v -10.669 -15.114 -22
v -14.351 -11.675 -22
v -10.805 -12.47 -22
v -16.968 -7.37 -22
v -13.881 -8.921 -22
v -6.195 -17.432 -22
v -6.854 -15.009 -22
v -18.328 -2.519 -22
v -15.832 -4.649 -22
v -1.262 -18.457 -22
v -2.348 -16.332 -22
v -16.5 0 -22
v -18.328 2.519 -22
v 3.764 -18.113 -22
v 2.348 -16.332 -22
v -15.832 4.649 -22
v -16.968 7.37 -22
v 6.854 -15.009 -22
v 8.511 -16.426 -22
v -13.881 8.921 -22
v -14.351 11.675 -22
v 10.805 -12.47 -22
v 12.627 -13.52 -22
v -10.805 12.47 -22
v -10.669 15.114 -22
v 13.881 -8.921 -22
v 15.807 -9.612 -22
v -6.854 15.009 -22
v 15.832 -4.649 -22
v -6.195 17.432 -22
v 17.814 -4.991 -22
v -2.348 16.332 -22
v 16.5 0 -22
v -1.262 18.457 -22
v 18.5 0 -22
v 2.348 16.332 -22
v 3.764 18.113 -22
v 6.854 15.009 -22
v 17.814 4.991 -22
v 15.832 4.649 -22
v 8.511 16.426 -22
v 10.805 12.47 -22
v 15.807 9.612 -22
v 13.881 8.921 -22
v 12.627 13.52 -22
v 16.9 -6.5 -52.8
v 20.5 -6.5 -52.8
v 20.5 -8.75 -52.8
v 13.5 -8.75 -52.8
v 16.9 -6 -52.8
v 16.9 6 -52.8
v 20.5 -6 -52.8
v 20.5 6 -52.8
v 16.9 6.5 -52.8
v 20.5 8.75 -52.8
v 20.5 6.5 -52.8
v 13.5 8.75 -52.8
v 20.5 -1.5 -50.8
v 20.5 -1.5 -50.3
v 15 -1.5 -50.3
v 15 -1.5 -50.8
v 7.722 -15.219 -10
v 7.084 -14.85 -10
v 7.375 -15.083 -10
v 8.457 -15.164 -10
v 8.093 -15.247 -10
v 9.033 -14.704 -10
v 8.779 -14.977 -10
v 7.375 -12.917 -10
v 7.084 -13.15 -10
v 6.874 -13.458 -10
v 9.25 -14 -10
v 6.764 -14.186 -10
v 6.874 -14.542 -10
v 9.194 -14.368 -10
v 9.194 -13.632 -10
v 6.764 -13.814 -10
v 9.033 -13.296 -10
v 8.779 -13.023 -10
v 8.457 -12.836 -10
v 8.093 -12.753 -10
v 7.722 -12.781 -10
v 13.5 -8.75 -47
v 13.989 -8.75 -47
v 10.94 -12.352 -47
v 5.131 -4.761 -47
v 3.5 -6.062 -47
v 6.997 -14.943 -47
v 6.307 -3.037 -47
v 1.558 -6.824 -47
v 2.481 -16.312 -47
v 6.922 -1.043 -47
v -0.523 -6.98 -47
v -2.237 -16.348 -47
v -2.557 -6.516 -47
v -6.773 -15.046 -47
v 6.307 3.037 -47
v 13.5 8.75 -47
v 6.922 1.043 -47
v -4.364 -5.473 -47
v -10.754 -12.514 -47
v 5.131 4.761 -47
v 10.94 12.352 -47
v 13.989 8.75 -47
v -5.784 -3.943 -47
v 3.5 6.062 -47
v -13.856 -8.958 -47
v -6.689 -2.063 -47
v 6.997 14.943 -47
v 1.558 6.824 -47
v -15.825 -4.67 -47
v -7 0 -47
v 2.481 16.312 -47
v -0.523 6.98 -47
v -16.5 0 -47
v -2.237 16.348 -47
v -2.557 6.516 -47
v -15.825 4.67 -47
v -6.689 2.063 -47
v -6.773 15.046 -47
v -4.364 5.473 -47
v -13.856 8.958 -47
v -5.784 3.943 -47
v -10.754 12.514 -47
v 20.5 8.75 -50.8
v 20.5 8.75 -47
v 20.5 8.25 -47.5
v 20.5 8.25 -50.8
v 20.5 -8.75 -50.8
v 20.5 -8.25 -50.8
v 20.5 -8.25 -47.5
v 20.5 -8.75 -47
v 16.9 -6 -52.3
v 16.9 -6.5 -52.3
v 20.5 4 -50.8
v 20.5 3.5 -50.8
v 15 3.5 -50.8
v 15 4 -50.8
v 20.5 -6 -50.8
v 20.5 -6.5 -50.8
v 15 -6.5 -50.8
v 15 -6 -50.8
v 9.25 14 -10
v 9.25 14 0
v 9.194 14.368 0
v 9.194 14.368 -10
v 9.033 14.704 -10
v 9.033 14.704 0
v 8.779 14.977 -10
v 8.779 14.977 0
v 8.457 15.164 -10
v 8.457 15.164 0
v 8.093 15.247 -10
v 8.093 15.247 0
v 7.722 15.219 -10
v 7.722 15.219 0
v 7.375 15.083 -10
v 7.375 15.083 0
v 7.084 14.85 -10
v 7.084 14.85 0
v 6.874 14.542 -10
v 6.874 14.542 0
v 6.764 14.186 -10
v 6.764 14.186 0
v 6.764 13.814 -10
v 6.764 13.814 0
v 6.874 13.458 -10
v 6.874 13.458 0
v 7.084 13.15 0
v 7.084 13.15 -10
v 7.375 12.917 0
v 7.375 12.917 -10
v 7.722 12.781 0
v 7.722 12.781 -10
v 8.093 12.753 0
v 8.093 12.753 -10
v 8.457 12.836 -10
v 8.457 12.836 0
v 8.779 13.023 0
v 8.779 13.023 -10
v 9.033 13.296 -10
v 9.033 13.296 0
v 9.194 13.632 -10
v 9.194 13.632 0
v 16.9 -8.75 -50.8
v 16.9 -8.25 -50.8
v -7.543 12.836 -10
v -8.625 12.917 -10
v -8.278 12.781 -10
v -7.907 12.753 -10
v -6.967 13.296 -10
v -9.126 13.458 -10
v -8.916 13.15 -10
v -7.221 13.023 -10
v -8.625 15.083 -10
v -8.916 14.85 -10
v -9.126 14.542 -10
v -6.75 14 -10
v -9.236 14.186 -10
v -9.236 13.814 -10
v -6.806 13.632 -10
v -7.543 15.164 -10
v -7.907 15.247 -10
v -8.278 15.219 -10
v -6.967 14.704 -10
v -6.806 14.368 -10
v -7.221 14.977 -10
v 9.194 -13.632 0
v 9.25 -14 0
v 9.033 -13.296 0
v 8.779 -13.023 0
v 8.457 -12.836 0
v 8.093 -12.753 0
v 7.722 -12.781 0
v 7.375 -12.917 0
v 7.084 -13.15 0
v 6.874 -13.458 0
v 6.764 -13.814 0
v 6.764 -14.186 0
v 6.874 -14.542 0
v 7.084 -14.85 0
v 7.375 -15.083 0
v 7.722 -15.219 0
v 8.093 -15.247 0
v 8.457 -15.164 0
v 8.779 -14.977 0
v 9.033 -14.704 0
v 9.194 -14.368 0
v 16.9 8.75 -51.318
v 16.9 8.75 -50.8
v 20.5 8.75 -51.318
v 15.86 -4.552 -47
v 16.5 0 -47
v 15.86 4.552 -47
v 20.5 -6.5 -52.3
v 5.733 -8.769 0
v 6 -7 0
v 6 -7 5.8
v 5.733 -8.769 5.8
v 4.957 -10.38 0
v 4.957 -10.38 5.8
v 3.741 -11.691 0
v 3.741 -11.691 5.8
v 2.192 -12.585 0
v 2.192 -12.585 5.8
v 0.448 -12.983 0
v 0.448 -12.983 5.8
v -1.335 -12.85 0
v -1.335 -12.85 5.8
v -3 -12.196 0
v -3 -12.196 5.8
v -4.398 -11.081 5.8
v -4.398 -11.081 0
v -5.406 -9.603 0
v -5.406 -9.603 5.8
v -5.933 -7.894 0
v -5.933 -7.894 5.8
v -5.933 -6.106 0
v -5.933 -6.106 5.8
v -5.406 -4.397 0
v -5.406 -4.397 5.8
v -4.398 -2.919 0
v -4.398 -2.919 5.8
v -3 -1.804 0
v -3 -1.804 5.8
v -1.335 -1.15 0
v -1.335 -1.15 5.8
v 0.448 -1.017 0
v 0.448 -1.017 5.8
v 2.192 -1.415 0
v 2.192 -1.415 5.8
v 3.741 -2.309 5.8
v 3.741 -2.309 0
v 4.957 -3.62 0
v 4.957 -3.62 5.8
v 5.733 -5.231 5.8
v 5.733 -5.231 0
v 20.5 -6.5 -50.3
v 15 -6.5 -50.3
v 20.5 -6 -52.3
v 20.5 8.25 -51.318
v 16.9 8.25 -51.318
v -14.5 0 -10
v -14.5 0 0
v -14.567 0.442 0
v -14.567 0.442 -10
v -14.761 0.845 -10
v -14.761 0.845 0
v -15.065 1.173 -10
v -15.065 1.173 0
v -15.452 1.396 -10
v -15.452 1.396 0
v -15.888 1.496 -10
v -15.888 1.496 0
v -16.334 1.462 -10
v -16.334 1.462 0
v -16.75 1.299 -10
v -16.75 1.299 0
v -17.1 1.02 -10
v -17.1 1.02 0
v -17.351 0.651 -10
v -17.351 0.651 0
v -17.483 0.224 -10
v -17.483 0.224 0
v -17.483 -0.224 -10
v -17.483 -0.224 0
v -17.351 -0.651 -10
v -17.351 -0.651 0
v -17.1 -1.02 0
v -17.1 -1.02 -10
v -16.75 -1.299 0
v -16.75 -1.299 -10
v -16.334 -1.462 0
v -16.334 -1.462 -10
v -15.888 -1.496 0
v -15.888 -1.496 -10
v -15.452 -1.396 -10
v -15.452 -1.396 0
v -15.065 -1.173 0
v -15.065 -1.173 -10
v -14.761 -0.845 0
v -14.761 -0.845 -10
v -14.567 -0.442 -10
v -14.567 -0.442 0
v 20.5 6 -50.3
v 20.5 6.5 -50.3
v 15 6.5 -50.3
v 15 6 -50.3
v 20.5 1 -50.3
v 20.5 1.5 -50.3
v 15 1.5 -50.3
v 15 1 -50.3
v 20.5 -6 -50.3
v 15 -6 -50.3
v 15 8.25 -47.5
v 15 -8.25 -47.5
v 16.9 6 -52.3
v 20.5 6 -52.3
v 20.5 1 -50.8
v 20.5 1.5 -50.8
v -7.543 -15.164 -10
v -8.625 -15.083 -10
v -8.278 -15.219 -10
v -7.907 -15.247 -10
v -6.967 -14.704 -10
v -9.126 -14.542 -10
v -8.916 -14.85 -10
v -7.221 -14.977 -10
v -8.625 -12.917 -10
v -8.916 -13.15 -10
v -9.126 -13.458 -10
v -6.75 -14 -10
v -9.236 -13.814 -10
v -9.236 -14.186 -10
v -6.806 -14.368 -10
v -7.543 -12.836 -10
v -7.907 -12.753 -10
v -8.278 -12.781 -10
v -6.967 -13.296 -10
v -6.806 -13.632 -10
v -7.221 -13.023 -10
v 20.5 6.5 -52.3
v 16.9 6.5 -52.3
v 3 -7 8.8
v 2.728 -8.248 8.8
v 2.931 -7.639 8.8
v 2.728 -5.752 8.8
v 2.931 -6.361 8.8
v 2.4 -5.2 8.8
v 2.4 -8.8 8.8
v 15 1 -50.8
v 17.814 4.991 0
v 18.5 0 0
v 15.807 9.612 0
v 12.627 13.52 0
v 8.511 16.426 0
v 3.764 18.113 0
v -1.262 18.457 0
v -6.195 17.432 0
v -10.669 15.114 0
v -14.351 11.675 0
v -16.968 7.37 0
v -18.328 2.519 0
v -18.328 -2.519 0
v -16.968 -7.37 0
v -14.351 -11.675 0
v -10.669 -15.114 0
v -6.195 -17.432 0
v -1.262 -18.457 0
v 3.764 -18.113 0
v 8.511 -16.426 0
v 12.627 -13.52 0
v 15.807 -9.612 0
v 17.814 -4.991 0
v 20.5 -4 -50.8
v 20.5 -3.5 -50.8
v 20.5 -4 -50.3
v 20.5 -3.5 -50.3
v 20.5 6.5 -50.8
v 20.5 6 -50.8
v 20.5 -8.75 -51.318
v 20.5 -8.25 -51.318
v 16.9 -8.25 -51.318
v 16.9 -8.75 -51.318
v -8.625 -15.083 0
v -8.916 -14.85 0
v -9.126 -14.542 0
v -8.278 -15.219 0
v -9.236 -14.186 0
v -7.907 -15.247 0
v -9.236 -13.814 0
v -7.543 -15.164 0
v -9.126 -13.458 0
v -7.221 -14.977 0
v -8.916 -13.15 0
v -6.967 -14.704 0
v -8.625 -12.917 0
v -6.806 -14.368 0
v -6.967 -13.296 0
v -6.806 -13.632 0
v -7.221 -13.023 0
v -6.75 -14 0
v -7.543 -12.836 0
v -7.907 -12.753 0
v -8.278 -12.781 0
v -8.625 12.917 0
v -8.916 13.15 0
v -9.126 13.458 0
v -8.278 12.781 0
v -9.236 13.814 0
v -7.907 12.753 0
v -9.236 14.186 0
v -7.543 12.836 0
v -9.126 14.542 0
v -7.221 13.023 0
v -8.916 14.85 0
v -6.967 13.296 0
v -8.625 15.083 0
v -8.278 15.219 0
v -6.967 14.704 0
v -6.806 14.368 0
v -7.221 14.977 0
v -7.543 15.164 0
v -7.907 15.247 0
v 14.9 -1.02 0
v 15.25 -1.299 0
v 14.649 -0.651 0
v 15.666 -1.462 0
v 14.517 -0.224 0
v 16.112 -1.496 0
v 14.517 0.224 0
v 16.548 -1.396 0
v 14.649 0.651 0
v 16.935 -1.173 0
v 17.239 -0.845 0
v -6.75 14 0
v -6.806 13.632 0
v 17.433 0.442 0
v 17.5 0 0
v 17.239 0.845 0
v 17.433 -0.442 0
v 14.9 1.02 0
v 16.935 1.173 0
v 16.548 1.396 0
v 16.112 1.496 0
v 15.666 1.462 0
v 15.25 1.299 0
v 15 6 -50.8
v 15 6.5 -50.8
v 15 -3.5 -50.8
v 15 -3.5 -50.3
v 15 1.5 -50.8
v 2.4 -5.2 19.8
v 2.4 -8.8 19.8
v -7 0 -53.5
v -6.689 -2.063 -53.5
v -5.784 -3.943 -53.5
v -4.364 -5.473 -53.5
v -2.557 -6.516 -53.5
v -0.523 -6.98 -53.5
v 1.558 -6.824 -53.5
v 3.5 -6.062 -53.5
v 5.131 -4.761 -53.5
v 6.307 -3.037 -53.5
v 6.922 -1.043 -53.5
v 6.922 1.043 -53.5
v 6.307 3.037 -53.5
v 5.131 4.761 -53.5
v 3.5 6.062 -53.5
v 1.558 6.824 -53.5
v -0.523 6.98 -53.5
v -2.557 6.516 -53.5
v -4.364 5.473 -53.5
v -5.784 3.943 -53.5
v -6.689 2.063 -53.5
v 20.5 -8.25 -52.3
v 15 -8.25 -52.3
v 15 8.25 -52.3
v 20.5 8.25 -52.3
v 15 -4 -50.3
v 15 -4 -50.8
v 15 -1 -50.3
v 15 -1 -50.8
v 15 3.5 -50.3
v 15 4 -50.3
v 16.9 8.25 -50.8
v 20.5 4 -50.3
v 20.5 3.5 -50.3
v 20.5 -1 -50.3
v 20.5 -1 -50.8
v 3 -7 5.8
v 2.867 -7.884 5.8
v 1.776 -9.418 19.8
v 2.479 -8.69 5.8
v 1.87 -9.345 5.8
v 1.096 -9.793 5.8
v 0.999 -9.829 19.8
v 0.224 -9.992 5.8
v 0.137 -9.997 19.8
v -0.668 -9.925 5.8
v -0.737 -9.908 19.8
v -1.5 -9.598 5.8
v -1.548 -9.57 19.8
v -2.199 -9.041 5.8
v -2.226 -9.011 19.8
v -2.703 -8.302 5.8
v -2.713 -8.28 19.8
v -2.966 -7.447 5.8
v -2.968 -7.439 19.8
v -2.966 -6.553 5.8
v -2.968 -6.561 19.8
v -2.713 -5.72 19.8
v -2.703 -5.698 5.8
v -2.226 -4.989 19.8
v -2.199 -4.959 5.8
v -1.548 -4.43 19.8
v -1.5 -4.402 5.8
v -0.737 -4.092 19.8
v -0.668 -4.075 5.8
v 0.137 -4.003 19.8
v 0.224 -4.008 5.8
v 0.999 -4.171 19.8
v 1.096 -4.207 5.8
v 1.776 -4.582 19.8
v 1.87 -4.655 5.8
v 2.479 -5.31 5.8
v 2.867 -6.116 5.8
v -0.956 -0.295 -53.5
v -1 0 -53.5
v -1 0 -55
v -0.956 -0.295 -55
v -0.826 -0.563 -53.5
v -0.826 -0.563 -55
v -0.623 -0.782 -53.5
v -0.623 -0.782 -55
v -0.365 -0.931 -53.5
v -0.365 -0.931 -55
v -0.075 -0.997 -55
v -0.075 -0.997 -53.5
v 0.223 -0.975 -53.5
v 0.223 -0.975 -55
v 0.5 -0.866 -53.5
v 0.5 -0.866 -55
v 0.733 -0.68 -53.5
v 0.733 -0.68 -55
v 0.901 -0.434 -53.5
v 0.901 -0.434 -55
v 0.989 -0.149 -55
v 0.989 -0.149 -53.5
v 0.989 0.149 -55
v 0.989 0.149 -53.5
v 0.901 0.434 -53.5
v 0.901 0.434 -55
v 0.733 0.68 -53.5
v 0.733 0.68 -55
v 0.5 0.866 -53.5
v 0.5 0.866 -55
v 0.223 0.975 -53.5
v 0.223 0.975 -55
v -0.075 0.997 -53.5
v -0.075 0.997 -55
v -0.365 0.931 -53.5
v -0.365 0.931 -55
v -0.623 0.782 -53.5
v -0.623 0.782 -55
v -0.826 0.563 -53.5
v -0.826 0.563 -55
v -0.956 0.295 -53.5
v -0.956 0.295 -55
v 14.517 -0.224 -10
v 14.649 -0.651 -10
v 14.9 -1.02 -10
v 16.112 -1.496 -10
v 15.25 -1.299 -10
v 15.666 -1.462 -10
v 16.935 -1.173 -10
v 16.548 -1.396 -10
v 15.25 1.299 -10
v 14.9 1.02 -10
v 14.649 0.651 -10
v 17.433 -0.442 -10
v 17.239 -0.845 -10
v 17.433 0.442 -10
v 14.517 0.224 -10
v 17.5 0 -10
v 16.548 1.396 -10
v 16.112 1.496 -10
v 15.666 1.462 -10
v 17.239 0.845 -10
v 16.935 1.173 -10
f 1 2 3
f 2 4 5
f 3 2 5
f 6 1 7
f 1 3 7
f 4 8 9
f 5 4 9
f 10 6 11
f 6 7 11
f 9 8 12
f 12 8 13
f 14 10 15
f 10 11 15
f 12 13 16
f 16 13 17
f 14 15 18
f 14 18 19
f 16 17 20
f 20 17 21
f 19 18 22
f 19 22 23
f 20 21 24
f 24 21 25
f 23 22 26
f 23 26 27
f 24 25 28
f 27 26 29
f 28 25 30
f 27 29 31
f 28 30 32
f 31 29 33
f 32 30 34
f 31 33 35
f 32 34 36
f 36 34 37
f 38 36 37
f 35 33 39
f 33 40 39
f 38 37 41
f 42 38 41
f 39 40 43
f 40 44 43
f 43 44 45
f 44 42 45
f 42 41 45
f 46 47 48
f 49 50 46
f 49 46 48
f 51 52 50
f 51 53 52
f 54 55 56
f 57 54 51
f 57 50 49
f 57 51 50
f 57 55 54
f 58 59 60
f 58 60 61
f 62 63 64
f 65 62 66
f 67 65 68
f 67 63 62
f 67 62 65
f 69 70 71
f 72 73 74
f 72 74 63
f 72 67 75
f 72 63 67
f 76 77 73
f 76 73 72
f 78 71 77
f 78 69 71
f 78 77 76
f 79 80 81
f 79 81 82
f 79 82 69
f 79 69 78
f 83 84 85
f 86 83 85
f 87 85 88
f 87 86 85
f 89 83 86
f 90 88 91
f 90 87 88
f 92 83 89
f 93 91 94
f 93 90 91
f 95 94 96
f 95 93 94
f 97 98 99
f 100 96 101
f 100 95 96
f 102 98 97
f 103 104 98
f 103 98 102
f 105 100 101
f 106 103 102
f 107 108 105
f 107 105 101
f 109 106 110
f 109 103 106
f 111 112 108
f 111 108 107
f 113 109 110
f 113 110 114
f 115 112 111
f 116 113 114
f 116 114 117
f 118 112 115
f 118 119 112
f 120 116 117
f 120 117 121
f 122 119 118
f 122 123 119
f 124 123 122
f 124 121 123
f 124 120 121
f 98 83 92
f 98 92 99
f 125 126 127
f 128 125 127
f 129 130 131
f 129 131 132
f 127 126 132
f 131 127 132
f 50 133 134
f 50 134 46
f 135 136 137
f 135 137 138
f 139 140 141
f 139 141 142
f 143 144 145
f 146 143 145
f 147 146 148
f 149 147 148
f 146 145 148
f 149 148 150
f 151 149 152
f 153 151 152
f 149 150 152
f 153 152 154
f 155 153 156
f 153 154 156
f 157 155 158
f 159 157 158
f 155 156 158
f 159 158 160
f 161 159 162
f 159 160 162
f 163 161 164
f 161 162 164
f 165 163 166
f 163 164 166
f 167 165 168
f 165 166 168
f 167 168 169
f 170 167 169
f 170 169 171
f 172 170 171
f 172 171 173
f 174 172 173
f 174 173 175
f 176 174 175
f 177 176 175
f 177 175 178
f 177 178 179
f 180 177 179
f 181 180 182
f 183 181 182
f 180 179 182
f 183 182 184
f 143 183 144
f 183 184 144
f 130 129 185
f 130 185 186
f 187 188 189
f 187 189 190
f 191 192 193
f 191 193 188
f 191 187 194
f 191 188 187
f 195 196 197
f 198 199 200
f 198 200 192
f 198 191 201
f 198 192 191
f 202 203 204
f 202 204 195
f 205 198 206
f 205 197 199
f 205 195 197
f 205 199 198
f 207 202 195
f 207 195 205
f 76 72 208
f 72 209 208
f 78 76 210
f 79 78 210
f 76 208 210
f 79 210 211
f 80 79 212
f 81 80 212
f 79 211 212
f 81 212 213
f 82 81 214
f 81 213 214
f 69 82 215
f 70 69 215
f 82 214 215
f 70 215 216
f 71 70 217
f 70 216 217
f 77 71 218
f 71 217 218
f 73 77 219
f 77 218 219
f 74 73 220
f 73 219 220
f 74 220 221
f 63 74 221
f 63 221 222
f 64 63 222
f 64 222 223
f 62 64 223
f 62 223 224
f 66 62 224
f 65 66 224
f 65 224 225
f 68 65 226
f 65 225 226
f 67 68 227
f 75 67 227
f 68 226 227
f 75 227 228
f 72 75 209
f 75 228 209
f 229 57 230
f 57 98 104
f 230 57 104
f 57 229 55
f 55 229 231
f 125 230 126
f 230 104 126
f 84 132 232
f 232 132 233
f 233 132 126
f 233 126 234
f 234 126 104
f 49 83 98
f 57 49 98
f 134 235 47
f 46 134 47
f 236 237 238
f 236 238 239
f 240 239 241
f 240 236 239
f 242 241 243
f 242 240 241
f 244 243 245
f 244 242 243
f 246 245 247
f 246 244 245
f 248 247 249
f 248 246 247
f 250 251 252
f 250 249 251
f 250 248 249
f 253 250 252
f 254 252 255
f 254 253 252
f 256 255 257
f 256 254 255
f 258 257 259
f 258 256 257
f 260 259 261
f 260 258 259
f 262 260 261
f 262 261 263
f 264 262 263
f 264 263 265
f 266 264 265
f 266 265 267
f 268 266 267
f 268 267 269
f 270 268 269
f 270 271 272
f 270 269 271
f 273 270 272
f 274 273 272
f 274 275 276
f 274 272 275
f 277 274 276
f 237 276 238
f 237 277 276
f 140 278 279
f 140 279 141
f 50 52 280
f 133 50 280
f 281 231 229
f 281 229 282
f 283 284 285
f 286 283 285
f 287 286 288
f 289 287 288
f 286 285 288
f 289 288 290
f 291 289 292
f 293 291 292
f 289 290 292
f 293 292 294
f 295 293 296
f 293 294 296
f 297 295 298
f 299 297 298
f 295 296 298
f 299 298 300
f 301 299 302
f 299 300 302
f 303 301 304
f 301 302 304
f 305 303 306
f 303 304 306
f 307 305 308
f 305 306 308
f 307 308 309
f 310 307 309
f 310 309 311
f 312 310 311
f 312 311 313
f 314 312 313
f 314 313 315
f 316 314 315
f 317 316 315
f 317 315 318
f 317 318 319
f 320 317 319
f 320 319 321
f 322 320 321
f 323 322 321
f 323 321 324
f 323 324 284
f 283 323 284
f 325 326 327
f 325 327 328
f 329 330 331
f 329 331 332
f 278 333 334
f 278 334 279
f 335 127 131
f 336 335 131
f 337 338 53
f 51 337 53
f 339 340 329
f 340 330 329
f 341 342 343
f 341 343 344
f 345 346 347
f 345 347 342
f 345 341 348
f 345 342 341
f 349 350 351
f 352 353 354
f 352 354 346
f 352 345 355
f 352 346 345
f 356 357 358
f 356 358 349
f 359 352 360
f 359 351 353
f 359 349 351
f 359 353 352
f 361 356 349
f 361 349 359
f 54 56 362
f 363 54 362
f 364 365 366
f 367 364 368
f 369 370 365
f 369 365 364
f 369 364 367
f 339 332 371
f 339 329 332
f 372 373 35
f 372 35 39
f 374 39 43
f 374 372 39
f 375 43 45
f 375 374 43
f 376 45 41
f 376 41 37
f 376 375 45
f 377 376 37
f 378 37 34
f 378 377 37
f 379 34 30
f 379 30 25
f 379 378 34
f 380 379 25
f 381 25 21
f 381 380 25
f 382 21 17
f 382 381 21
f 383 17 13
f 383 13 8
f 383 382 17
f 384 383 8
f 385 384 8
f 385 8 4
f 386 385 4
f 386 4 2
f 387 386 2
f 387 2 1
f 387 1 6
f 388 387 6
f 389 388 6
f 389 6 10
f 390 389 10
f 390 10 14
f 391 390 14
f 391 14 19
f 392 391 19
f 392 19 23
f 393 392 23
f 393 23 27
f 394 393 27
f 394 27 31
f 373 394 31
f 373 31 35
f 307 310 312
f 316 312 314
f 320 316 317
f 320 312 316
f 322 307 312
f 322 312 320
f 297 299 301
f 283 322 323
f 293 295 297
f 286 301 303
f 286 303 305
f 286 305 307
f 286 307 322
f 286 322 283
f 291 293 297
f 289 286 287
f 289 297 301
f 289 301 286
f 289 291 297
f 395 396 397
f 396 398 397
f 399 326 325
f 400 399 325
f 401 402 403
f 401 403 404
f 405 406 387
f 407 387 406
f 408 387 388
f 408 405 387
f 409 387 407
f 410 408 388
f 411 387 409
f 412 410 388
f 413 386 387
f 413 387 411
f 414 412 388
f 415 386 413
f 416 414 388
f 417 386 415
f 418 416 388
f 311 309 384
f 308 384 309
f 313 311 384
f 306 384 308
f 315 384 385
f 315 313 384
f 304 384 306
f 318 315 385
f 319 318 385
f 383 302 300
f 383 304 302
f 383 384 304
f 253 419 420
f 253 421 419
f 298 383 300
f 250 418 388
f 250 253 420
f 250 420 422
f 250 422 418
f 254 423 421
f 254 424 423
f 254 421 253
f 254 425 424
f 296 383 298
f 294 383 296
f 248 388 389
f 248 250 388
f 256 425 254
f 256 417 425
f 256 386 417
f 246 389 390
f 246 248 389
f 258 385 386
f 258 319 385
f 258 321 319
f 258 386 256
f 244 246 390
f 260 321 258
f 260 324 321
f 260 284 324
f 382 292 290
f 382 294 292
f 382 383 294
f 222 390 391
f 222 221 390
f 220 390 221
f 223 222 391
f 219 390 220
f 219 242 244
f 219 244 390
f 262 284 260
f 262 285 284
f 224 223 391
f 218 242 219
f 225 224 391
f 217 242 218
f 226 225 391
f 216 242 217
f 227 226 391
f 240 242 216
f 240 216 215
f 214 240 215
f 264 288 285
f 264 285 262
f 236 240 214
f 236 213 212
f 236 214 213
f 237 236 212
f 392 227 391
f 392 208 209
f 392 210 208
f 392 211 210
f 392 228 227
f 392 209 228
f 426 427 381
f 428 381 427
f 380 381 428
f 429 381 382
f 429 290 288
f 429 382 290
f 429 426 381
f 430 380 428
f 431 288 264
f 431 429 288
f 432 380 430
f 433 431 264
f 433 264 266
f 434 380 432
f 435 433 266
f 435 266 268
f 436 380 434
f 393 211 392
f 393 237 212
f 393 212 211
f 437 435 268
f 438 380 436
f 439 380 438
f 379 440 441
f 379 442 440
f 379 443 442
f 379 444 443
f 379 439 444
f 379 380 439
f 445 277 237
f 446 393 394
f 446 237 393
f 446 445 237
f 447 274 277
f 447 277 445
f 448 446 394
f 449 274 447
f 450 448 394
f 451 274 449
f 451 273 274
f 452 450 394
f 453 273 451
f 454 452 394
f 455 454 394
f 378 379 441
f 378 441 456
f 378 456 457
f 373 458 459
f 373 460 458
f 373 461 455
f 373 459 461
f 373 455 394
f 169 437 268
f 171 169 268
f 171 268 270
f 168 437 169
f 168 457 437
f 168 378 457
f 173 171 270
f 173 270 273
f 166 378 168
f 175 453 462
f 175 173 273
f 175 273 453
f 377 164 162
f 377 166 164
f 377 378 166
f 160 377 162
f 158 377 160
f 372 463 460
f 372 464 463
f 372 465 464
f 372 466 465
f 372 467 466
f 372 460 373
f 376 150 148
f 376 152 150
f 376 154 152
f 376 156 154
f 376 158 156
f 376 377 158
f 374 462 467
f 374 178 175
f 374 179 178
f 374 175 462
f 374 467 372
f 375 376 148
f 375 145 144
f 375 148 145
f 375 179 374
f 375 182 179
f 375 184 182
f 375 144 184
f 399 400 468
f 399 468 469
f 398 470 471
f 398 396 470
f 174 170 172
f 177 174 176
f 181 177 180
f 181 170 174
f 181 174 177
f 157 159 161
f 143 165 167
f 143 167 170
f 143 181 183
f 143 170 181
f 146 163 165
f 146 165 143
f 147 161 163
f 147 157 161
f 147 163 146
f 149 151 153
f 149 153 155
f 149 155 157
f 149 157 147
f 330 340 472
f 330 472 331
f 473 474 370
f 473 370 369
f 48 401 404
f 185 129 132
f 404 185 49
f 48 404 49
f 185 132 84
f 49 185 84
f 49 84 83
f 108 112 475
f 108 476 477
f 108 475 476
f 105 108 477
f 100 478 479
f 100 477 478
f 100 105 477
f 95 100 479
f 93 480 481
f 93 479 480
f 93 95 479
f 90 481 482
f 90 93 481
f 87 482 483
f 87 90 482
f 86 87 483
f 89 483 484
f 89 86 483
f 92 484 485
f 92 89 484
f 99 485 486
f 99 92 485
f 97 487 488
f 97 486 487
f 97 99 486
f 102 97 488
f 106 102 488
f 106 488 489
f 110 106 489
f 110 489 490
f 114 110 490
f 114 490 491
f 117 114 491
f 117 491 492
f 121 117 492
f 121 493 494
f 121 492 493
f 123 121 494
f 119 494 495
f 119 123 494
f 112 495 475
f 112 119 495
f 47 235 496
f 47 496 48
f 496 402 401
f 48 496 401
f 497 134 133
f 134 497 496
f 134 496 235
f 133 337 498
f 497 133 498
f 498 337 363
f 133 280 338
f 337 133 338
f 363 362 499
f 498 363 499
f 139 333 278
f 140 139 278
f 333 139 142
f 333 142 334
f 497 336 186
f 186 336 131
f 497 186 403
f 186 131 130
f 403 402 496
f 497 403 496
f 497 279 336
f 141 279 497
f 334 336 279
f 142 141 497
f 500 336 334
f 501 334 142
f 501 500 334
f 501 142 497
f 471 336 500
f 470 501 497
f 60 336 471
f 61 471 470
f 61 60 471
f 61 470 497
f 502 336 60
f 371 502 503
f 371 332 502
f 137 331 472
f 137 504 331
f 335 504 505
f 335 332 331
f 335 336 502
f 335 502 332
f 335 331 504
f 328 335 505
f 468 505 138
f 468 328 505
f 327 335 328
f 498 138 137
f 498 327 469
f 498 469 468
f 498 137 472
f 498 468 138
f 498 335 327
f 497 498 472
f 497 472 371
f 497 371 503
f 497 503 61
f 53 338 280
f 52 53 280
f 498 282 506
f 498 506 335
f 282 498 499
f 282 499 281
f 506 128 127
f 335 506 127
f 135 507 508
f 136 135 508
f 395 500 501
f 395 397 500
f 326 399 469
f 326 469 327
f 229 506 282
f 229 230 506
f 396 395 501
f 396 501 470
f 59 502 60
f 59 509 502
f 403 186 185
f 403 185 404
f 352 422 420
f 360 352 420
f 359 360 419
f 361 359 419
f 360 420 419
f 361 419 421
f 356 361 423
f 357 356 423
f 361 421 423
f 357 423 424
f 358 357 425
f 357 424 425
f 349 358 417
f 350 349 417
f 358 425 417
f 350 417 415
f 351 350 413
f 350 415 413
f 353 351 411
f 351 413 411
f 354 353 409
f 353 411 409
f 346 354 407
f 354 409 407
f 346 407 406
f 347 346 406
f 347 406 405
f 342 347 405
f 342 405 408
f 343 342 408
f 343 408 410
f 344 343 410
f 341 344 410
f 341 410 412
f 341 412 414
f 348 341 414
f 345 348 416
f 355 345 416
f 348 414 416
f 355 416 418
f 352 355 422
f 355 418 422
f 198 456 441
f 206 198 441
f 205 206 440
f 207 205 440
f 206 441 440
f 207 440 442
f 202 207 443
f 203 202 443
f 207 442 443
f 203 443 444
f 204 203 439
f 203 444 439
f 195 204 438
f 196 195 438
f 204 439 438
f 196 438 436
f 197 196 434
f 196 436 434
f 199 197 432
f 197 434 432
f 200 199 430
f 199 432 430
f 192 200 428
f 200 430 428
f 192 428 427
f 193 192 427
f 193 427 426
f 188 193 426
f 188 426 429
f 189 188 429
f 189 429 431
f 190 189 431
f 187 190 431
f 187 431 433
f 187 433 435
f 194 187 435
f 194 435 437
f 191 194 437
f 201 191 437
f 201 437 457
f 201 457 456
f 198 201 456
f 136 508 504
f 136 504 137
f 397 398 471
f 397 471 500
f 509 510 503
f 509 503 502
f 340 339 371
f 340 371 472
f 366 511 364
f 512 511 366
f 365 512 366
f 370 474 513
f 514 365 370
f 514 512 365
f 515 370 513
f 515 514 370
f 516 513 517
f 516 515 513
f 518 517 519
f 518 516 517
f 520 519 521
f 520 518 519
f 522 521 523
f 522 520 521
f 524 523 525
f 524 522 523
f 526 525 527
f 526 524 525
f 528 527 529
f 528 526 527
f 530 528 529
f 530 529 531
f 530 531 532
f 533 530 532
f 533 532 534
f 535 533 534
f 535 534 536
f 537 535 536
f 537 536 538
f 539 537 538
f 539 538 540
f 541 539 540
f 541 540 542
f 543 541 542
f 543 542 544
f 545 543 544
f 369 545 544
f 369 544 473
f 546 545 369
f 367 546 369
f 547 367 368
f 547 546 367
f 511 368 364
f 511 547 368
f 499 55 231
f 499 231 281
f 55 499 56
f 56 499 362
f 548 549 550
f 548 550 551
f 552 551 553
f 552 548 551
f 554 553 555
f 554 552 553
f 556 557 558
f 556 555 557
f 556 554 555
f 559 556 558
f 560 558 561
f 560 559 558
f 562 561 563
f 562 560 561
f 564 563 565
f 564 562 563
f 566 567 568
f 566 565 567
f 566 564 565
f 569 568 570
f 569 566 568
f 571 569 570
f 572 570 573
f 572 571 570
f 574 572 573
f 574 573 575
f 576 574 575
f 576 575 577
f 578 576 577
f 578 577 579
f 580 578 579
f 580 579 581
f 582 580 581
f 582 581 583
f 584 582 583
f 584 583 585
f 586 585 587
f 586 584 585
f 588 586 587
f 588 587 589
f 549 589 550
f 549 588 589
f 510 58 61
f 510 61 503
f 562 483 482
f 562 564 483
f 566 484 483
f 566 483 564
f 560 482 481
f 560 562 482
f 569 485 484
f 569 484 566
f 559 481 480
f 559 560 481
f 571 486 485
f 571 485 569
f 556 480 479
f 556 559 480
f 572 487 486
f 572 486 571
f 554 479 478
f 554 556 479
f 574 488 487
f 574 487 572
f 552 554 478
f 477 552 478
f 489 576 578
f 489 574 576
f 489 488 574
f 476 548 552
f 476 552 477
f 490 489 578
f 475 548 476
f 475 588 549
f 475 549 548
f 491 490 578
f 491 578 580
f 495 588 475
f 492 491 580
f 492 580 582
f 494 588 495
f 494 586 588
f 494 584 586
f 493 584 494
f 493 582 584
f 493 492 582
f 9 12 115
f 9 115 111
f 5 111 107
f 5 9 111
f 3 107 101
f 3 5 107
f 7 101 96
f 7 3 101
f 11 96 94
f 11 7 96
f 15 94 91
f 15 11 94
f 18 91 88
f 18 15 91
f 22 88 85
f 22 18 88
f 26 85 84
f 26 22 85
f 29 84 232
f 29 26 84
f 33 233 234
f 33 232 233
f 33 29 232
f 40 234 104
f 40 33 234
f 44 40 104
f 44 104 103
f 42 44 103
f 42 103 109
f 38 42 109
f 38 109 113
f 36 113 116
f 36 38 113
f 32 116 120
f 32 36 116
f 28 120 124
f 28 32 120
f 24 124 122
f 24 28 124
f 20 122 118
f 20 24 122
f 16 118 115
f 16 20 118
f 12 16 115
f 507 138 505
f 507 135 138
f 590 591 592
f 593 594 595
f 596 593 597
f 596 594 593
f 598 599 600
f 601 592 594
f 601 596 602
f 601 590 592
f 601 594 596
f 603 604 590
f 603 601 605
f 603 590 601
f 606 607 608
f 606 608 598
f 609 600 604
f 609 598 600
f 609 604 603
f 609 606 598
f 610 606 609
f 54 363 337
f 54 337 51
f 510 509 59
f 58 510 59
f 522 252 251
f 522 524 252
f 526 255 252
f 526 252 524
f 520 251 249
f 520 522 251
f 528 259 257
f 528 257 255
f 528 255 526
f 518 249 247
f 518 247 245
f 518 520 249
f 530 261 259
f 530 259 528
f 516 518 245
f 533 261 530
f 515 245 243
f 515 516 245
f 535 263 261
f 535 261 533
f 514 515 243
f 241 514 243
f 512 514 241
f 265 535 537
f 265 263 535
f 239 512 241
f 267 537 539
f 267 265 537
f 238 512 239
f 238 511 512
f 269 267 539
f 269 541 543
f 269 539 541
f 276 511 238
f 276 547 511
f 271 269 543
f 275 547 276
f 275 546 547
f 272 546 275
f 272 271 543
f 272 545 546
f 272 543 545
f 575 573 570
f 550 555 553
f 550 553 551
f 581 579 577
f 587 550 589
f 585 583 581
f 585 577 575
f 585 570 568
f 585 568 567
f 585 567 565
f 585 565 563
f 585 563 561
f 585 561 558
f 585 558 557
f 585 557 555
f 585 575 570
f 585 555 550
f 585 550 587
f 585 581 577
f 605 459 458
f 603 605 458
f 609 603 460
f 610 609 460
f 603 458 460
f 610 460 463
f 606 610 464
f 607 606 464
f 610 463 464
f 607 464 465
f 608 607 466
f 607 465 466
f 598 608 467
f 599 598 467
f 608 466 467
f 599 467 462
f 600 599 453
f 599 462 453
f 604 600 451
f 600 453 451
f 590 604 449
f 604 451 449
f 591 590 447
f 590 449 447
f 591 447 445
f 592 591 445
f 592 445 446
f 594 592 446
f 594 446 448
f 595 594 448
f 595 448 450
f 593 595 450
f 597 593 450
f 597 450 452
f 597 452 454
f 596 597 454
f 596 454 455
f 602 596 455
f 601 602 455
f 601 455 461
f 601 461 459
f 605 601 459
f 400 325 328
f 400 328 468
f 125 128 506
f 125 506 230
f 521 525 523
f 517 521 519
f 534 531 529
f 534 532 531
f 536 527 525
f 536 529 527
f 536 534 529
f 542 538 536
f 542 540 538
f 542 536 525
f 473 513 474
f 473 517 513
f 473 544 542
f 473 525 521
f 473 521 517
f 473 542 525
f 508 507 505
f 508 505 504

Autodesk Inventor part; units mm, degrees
ref_plane "YZ Plane" through (0, 0, 0) normal (1, 0, 0) x (0, 1, 0)
ref_plane "XZ Plane" through (0, 0, 0) normal (0, 1, 0) x (-1, 0, 0)
ref_plane "XY Plane" through (0, 0, 0) normal (0, 0, 1) x (1, 0, 0)
sketch "Sketch1" plane through (0, 0, 0) normal (0, 0, 1) x (1, 0, 0)
  circle A0 centre (0, 0) radius 18.5
  dimension "d0" = 37
extrude "Extrusion1" add sketch "Sketch1" against normal blind 22
sketch "Sketch2" plane through (0, 0, -22) normal (0, 0, -1) x (-1, 0, 0)
  circle A0 centre (0, 0) radius 18.5 projected
  circle A1 centre (0, 0) radius 16.5
  dimension "d3" = 33
extrude "Extrusion2" add sketch "Sketch2" along normal blind 25 contours A1
sketch "Sketch3" plane through (0, 0, -47) normal (0, 0, -1) x (-1, 0, 0)
  circle A0 centre (0, 0) radius 18.5 projected
  circle A1 centre (0, 0) radius 7
  dimension "d6" = 14
extrude "Extrusion3" add sketch "Sketch3" along normal blind 6.5 contours A1
sketch "Sketch4" plane through (0, 0, -53.5) normal (0, 0, -1) x (-1, 0, 0)
  circle A0 centre (0, 0) radius 1
  dimension "d9" = 2
extrude "Extrusion4" add sketch "Sketch4" along normal blind 1.5
sketch "Sketch5" plane through (0, 0, -47) normal (0, 0, -1) x (-1, 0, 0)
  line L0 (-20.5, -8.75) -> (-13.5, -8.75)
  line L1 (-13.5, -8.75) -> (-13.5, 8.75)
  line L2 (-13.5, 8.75) -> (-20.5, 8.75)
  line L3 (-20.5, 8.75) -> (-20.5, -8.75)
  circle A0 centre (0, 0) radius 16.5 projected
  dimension "d12" = 17.5
  dimension "d13" = 7
  dimension "d14" = 8.75
  dimension "d15" = 37
extrude "Extrusion5" add sketch "Sketch5" along normal blind 5.8 contours L3 L2 A0 L0 | A0 L2 L1 L0 picked at (-14.4657, -0.6136)
sketch "Sketch6" plane through (20.5, -8.75, -47) normal (1, 0, 0) x (0, 0, -1)
  line L0 (5.3, 17) -> (0.5, 17)
  line L1 (0.5, 17) -> (0.5, 0.5)
  line L2 (0.5, 0.5) -> (5.3, 0.5)
  line L3 (5.3, 0.5) -> (5.3, 17)
  line L4 (0, 17.5) -> (5.8, 17.5) projected
  line L5 (5.8, 17.5) -> (5.8, 0) projected
  line L6 (0, 0) -> (5.8, 0) projected
  line L7 (0, 17.5) -> (0, 0) projected
  line L8 (3.8, 15.25) -> (3.3, 15.25)
  line L9 (3.3, 15.25) -> (3.3, 14.75)
  line L10 (3.3, 14.75) -> (3.8, 14.75)
  line L11 (3.8, 14.75) -> (3.8, 15.25)
  line L12 (3.8, 12.75) -> (3.3, 12.75)
  line L13 (3.8, 12.25) -> (3.8, 12.75)
  line L14 (3.3, 12.25) -> (3.8, 12.25)
  line L15 (3.3, 12.75) -> (3.3, 12.25)
  line L16 (3.8, 10.25) -> (3.3, 10.25)
  line L17 (3.8, 9.75) -> (3.8, 10.25)
  line L18 (3.3, 9.75) -> (3.8, 9.75)
  line L19 (3.3, 10.25) -> (3.3, 9.75)
  line L20 (3.8, 7.75) -> (3.3, 7.75)
  line L21 (3.8, 7.25) -> (3.8, 7.75)
  line L22 (3.3, 7.25) -> (3.8, 7.25)
  line L23 (3.3, 7.75) -> (3.3, 7.25)
  line L24 (3.8, 5.25) -> (3.3, 5.25)
  line L25 (3.8, 4.75) -> (3.8, 5.25)
  line L26 (3.3, 4.75) -> (3.8, 4.75)
  line L27 (3.3, 5.25) -> (3.3, 4.75)
  line L28 (3.8, 2.75) -> (3.3, 2.75)
  line L29 (3.8, 2.25) -> (3.8, 2.75)
  line L30 (3.3, 2.25) -> (3.8, 2.25)
  line L31 (3.3, 2.75) -> (3.3, 2.25)
  line L32 (0, 17.5) -> (5.8, 17.5) projected
  line L33 (4.3185, 17) -> (3.8, 17)
  line L34 (3.8, 17) -> (3.8, 17.5)
  line L35 (3.8, 17.5) -> (4.3185, 17.5)
  line L36 (4.3185, 17.5) -> (4.3185, 17)
  line L37 (3.8, 0.5) -> (4.3185, 0.5)
  line L38 (4.3185, 0.5) -> (4.3185, 0)
  line L39 (4.3185, 0) -> (3.8, 0)
  line L40 (3.8, 0) -> (3.8, 0.5)
  line L41 (5.8, 15.25) -> (5.3, 15.25)
  line L42 (5.3, 15.25) -> (5.3, 14.75)
  line L43 (5.3, 14.75) -> (5.8, 14.75)
  line L44 (5.8, 14.75) -> (5.8, 15.25)
  line L45 (5.8, 2.75) -> (5.3, 2.75)
  line L46 (5.3, 2.75) -> (5.3, 2.25)
  line L47 (5.3, 2.25) -> (5.8, 2.25)
  line L48 (5.8, 2.25) -> (5.8, 2.75)
  point P0 (-47, 8.75)
  dimension "d18" = 0.5
  dimension "d19" = 0.5
  dimension "d20" = 0.5
  dimension "d21" = 0.5
  dimension "d22" = 0.5
  dimension "d23" = 0.5
  dimension "d26" = 2.5
  dimension "d31" = 1.5
  dimension "d32" = 1.75
extrude "Extrusion6" cut sketch "Sketch6" against normal blind 5.5 contours L3 L2 L1 L0
extrude "Extrusion7" cut sketch "Sketch6" against normal blind 3.6 contours L0 L34 L4 L36 | L41 L5 L43 L3 | L45 L5 L47 L3 | L2 L38 L6 L40
sketch "Sketch7" plane through (0, 0, 0) normal (0, 0, 1) x (1, 0, 0)
  circle A0 centre (-8, 14) radius 1.25 projected
  circle A1 centre (-16, 0) radius 1.5 projected
  circle A2 centre (-8, -14) radius 1.25 projected
  circle A3 centre (8, -14) radius 1.25 projected
  circle A4 centre (16, 0) radius 1.5 projected
  circle A5 centre (8, 14) radius 1.25 projected
  circle A6 centre (0, -7) radius 6
  point P0 (0, 0)
  dimension "d37" = 12
  dimension "d38" = 7
extrude "Extrusion8" add sketch "Sketch7" along normal blind 5.8 contours A6
sketch "Sketch8" plane through (0, -7, 5.8) normal (0, 0, 1) x (1, 0, 0)
  circle A0 centre (0, 7) radius 7 projected
  circle A1 centre (0, 0) radius 3
  dimension "d41" = 6
extrude "Extrusion9" add sketch "Sketch8" along normal blind 14 contours A1 A0 | A0 A1 picked at (-0.8611, 0.9867) picked at (-1.0544, -0.7781)
sketch "Sketch9" plane through (0, -7, 19.8) normal (0, 0, 1) x (1, 0, 0)
  line L0 (2.4, 2.1786) -> (4.1019, 2.1786)
  line L1 (4.1019, 2.1786) -> (4.1019, -2.6301)
  line L2 (4.1019, -2.6301) -> (2.4, -2.6301)
  line L3 (2.4, -2.6301) -> (2.4, 2.1786)
  circle A0 centre (0, 0) radius 3 projected
  point P0 (0, 7)
  dimension "d44" = 5.4
extrude "Extrusion10" cut sketch "Sketch9" against normal blind 11 contours L0 L1 L2 L3 A0 | A0 L3 picked at (2.5094, 0.416)
extrude "Extrusion11" cut sketch "Sketch7" against normal blind 10 contours A0 | A1 | A2 | A3 | A4 | A5
equation "\"d14\" = 0.5 * d12"
properties part number "Motor"
